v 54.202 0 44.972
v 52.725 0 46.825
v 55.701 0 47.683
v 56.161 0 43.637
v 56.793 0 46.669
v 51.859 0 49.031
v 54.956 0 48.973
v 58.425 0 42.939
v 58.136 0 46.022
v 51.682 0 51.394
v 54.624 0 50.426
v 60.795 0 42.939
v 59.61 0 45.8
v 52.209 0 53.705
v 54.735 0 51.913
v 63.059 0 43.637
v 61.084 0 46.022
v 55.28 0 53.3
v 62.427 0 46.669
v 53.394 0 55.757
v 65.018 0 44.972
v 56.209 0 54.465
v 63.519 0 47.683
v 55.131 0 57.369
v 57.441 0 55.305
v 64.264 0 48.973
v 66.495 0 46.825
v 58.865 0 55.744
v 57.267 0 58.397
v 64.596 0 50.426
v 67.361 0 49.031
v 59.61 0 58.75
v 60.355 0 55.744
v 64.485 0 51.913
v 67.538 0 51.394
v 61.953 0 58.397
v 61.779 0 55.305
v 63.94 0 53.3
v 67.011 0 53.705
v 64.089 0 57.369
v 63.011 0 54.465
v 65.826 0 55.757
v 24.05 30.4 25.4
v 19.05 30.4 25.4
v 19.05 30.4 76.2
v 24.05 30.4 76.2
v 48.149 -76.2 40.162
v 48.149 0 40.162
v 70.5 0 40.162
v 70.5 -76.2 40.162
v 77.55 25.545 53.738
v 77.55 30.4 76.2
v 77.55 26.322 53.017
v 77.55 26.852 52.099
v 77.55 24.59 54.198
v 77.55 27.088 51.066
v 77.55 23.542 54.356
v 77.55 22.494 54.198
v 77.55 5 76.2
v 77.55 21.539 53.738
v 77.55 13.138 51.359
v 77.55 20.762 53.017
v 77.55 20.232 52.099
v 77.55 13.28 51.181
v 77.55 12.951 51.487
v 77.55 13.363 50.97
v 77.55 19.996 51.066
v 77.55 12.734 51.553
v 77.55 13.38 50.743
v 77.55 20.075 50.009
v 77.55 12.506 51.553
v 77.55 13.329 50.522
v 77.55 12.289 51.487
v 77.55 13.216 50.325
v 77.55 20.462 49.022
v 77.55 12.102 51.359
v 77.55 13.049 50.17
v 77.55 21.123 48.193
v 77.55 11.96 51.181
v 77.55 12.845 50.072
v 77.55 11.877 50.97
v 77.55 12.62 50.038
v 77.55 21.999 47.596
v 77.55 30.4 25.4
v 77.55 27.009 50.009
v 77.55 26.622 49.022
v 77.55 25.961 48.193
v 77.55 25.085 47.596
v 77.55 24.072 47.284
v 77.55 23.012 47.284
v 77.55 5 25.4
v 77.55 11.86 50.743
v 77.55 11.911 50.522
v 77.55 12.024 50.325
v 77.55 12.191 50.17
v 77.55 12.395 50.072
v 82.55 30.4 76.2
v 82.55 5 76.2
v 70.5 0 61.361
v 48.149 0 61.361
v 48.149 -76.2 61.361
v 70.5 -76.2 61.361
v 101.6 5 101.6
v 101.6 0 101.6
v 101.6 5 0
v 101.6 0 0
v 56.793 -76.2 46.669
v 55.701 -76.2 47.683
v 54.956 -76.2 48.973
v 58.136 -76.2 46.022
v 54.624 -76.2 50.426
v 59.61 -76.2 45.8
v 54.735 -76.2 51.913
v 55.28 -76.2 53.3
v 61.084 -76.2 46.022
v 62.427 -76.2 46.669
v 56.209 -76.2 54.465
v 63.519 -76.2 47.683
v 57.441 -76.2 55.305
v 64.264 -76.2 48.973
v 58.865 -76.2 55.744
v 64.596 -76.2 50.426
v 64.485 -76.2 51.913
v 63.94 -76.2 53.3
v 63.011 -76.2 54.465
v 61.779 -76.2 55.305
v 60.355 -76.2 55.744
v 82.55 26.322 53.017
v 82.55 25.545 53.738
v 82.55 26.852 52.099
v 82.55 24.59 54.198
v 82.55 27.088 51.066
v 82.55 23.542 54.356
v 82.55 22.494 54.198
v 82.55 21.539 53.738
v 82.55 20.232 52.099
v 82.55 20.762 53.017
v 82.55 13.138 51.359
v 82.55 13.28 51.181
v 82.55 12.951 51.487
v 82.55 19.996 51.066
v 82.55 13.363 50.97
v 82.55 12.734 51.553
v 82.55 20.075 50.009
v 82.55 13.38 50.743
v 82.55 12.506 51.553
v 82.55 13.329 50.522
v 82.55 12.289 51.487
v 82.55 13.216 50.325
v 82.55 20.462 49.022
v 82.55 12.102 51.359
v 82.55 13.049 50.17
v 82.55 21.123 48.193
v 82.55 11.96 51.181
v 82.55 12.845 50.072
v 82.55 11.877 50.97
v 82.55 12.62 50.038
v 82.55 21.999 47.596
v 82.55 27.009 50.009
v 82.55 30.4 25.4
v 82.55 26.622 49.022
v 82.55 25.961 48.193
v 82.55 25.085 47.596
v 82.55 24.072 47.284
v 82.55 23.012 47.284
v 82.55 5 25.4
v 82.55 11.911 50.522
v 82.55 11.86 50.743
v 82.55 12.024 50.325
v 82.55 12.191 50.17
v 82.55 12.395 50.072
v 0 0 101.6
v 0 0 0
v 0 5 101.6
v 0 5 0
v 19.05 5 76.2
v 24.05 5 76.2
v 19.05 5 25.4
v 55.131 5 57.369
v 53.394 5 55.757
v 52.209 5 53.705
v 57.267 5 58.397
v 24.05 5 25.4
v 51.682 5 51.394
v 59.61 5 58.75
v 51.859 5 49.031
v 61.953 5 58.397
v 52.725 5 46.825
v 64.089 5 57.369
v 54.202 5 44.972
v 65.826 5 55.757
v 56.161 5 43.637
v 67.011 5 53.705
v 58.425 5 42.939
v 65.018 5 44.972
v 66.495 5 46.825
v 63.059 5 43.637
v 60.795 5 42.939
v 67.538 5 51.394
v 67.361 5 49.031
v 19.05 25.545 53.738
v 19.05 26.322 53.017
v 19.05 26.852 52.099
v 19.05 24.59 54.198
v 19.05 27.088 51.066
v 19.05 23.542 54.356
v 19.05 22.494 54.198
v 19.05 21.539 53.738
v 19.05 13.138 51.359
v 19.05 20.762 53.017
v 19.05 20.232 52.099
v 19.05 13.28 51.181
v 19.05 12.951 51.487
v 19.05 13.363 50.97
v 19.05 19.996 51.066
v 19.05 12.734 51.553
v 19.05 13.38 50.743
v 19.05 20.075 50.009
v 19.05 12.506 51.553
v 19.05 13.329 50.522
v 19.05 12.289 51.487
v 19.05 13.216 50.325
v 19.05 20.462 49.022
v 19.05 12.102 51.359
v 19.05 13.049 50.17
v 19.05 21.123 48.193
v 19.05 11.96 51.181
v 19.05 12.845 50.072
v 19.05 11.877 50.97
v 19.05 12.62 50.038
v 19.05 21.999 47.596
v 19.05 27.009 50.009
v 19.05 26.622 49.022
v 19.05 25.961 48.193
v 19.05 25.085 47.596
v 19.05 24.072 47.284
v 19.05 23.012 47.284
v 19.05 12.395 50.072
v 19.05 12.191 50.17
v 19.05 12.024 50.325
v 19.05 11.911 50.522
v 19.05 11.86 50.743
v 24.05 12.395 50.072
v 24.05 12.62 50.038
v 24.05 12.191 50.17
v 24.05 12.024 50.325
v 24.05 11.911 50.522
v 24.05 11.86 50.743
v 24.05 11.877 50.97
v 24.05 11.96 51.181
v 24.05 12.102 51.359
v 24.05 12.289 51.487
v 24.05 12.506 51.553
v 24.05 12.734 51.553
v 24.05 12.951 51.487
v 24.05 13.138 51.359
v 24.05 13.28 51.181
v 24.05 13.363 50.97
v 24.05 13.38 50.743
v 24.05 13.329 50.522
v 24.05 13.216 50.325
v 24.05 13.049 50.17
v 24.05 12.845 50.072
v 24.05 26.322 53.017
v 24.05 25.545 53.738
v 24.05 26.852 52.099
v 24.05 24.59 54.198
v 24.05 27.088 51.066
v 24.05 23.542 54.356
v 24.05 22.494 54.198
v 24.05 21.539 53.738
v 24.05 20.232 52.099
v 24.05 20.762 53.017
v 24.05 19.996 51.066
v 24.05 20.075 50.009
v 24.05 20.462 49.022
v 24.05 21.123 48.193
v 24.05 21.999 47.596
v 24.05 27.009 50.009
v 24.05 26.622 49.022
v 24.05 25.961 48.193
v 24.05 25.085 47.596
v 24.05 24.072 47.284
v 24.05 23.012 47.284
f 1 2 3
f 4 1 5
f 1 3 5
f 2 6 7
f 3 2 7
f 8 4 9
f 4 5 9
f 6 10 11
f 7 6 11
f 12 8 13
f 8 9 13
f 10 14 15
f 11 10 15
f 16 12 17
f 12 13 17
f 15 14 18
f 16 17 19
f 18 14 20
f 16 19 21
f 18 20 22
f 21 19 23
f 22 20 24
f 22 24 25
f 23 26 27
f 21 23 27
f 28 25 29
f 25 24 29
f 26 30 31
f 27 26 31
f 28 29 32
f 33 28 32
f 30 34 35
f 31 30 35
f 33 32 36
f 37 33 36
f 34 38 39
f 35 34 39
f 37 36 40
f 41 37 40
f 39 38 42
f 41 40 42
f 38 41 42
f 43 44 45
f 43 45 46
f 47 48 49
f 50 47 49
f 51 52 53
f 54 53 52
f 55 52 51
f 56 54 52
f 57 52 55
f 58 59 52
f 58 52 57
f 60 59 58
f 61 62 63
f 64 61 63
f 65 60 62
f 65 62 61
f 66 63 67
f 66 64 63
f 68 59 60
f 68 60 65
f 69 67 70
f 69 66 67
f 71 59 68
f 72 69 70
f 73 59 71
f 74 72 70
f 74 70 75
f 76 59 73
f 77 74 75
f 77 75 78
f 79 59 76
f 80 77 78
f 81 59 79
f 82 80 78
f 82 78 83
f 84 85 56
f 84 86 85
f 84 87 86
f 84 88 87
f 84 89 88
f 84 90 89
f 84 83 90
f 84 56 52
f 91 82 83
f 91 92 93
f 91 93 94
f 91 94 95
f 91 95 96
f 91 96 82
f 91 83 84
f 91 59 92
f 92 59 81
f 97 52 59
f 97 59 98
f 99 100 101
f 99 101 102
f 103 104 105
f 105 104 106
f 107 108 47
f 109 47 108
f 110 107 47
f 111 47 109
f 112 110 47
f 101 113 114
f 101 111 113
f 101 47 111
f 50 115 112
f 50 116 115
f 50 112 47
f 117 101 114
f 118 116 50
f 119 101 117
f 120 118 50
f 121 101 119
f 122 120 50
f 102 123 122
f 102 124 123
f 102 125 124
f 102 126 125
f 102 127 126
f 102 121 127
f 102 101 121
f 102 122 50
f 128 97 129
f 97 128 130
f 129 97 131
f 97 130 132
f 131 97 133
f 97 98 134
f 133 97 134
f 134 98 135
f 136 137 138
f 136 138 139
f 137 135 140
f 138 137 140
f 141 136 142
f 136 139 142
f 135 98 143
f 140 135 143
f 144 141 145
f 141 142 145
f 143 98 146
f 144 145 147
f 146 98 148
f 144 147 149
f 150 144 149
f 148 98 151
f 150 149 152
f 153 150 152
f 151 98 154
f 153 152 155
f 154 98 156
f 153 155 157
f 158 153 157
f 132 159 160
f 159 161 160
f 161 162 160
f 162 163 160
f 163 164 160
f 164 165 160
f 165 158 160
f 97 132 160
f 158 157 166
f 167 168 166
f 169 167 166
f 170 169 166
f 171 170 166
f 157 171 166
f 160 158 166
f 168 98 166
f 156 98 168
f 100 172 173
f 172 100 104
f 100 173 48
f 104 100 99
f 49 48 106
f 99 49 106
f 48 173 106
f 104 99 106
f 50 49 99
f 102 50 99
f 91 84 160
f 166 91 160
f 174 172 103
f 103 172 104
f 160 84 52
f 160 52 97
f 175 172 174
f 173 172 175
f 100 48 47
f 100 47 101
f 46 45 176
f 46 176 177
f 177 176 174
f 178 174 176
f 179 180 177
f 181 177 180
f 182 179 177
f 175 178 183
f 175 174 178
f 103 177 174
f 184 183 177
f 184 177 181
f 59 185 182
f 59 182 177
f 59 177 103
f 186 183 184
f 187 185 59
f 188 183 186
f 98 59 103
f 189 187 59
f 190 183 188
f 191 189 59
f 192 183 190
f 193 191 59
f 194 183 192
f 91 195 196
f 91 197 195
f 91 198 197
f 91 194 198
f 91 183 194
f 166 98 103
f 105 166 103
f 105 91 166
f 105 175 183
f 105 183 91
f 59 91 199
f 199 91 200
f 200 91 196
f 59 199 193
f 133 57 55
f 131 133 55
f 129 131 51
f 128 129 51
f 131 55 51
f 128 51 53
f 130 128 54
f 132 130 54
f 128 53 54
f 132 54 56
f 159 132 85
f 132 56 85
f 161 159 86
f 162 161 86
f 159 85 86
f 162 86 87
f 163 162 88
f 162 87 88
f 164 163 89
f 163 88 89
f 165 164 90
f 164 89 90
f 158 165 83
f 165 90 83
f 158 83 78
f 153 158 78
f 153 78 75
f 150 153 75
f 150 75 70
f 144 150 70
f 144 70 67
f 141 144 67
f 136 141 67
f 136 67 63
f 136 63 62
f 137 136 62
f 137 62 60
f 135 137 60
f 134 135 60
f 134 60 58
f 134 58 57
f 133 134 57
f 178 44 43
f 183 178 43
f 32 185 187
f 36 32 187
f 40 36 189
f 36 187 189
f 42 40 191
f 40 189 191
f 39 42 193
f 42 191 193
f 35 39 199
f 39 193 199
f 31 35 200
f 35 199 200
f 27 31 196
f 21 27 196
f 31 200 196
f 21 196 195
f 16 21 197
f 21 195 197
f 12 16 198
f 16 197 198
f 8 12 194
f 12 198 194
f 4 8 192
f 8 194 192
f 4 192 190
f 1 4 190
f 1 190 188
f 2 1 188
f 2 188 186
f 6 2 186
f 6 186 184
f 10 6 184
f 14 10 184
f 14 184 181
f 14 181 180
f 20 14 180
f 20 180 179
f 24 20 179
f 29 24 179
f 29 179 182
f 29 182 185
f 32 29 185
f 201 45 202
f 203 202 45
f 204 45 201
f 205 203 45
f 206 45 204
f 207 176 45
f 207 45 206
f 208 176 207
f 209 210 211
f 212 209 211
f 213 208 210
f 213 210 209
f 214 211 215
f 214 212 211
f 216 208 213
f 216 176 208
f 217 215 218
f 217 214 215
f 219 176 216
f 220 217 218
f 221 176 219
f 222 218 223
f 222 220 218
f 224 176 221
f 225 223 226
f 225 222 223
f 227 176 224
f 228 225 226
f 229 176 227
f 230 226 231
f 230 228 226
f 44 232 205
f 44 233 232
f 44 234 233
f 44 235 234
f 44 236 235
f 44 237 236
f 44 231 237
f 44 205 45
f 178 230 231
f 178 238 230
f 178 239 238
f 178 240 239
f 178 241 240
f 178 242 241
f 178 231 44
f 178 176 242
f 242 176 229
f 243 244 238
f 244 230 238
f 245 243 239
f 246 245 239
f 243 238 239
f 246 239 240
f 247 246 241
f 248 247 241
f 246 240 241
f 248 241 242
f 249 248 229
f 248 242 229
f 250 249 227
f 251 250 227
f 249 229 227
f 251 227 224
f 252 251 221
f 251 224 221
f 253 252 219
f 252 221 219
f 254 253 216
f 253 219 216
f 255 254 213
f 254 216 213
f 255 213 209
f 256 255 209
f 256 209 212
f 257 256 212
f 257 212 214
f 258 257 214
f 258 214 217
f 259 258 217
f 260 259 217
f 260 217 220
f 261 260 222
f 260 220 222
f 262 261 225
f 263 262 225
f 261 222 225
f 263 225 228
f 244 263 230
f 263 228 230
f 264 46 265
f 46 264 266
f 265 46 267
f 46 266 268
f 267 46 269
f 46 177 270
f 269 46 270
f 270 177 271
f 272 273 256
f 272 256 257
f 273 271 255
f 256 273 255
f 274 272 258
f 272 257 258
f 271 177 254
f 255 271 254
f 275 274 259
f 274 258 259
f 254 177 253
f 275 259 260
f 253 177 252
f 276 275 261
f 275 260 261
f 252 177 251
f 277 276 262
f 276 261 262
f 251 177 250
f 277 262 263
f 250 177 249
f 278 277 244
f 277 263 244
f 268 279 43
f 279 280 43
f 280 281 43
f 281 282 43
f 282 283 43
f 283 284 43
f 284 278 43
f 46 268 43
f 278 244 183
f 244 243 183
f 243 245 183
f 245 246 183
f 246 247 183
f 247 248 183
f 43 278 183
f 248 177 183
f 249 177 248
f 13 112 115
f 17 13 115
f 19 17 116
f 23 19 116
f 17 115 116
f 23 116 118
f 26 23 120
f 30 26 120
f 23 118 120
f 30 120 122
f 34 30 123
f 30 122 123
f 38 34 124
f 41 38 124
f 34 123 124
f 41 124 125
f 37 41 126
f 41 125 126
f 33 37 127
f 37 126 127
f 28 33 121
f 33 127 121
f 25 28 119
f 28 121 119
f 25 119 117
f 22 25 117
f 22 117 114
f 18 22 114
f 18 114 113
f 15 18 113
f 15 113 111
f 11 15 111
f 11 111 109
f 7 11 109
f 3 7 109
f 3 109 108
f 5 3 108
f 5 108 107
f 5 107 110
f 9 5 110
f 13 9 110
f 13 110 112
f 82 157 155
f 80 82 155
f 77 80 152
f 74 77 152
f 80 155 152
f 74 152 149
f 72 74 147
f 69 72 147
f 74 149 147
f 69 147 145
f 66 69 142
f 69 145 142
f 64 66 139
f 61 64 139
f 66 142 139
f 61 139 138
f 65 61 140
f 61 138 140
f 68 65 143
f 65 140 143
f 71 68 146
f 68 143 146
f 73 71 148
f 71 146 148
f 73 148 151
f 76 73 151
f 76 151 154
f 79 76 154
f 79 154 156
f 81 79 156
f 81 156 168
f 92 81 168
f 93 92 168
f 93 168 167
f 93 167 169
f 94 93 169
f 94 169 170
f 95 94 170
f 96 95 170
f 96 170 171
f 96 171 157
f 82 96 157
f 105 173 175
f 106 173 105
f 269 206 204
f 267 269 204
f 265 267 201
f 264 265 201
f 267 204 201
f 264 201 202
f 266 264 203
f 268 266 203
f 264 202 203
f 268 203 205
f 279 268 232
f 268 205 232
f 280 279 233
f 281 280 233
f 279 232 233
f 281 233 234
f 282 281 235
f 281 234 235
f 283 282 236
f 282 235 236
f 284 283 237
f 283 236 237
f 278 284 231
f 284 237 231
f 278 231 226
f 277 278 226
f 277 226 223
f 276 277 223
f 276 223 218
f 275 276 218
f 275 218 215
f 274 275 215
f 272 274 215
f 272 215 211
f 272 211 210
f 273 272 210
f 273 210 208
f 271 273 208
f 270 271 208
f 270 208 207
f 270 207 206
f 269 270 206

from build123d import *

# Parameters (mm, degrees)
SKETCH2_W           = 101.6
SKETCH2_H           = 101.6
BOSS_EXTRUDE2_DEPTH = 5
SKETCH3_W           = 5
SKETCH3_H           = 50.8
BOSS_EXTRUDE3_DEPTH = 25.4
SKETCH4_W           = 5
SKETCH4_H           = 50.8
BOSS_EXTRUDE4_DEPTH = 25.4
SKETCH8_R           = 3.556
CUT_EXTRUDE1_DEPTH  = 135.392047756
CUT_EXTRUDE2_REACH  = 136.392
SKETCH9_R           = 0.762
SKETCH11_R          = 7.9502
CUT_EXTRUDE3_DEPTH  = 146.911891222
CUT_EXTRUDE5_REACH  = 136.392
SKETCH18_R          = 0.762
SKETCH19_W          = 22.350467385
SKETCH19_H          = 21.198381437
BOSS_EXTRUDE5_DEPTH = 76.2
SKETCH22_R          = 5
CUT_EXTRUDE6_DEPTH  = 179.909697893


with BuildPart() as part:
    # Sketch2 → Boss-Extrude2 (new body)
    with BuildSketch(Plane(origin=(0, 0, 0), x_dir=(1, 0, 0), z_dir=(0, 1, 0))):
        with Locations((50.8, -50.8)):
            Rectangle(SKETCH2_W, SKETCH2_H)
    extrude(amount=BOSS_EXTRUDE2_DEPTH)

    # Sketch3 → Boss-Extrude3 (add)
    with BuildSketch(Plane(origin=(0, 5, 0), x_dir=(1, 0, 0), z_dir=(0, 1, 0))):
        with Locations((21.55, -50.8)):
            Rectangle(SKETCH3_W, SKETCH3_H)
    extrude(amount=BOSS_EXTRUDE3_DEPTH)

    # Sketch4 → Boss-Extrude4 (add)
    with BuildSketch(Plane(origin=(0, 5, 0), x_dir=(1, 0, 0), z_dir=(0, 1, 0))):
        with Locations((80.05, -50.8)):
            Rectangle(SKETCH4_W, SKETCH4_H)
    extrude(amount=BOSS_EXTRUDE4_DEPTH)

    # Sketch8 → Cut-Extrude1 (cut, through all)
    with BuildSketch(Plane.ZY.offset(-19.05)):
        with Locations((50.8, 23.542)):
            Circle(SKETCH8_R)
    extrude(amount=-CUT_EXTRUDE1_DEPTH, mode=Mode.SUBTRACT)

    # Sketch9 → Cut-Extrude2 (cut, up to next)
    with BuildSketch(Plane(origin=(82.55, 0, 0), x_dir=(0, 0, -1), z_dir=(1, 0, 0)), mode=Mode.PRIVATE) as cut_extrude2_sk1:
        with Locations((-50.8, 12.62)):
            Circle(SKETCH9_R)
    cut_extrude2_tool1 = extrude(cut_extrude2_sk1.sketch, amount=-CUT_EXTRUDE2_REACH, mode=Mode.PRIVATE) & part.part
    add(cut_extrude2_tool1.solids().sort_by_distance((82.55, 12.62, 50.8))[0], mode=Mode.SUBTRACT)

    # Sketch11 → Cut-Extrude3 (cut, through all)
    with BuildSketch(Plane(origin=(0, 5, 0), x_dir=(1, 0, 0), z_dir=(0, 1, 0))):
        with Locations(Location((59.61, -50.8, 0), (0, 0, 270))):
            Circle(SKETCH11_R)
    extrude(amount=-CUT_EXTRUDE3_DEPTH, mode=Mode.SUBTRACT)

    # Sketch18 → Cut-Extrude5 (cut, up to next)
    with BuildSketch(Plane.ZY.offset(-19.05), mode=Mode.PRIVATE) as cut_extrude5_sk1:
        with Locations(Location((50.8, 12.62, 0), (0, 0, 180))):
            Circle(SKETCH18_R)
    cut_extrude5_tool1 = extrude(cut_extrude5_sk1.sketch, amount=-CUT_EXTRUDE5_REACH, mode=Mode.PRIVATE) & part.part
    add(cut_extrude5_tool1.solids().sort_by_distance((19.05, 12.62, 50.8))[0], mode=Mode.SUBTRACT)

    # Sketch19 → Boss-Extrude5 (add)
    with BuildSketch(Plane.XZ):
        with Locations((59.324658632, 50.761526183)):
            Rectangle(SKETCH19_W, SKETCH19_H)
    extrude(amount=BOSS_EXTRUDE5_DEPTH)

    # Sketch22 → Cut-Extrude6 (cut, through all)
    with BuildSketch(Plane.XZ.offset(76.2)):
        with Locations(Location((59.61, 50.8, 0), (0, 0, 270))):
            Circle(SKETCH22_R)
    extrude(amount=-CUT_EXTRUDE6_DEPTH, mode=Mode.SUBTRACT)


solid = part.part
